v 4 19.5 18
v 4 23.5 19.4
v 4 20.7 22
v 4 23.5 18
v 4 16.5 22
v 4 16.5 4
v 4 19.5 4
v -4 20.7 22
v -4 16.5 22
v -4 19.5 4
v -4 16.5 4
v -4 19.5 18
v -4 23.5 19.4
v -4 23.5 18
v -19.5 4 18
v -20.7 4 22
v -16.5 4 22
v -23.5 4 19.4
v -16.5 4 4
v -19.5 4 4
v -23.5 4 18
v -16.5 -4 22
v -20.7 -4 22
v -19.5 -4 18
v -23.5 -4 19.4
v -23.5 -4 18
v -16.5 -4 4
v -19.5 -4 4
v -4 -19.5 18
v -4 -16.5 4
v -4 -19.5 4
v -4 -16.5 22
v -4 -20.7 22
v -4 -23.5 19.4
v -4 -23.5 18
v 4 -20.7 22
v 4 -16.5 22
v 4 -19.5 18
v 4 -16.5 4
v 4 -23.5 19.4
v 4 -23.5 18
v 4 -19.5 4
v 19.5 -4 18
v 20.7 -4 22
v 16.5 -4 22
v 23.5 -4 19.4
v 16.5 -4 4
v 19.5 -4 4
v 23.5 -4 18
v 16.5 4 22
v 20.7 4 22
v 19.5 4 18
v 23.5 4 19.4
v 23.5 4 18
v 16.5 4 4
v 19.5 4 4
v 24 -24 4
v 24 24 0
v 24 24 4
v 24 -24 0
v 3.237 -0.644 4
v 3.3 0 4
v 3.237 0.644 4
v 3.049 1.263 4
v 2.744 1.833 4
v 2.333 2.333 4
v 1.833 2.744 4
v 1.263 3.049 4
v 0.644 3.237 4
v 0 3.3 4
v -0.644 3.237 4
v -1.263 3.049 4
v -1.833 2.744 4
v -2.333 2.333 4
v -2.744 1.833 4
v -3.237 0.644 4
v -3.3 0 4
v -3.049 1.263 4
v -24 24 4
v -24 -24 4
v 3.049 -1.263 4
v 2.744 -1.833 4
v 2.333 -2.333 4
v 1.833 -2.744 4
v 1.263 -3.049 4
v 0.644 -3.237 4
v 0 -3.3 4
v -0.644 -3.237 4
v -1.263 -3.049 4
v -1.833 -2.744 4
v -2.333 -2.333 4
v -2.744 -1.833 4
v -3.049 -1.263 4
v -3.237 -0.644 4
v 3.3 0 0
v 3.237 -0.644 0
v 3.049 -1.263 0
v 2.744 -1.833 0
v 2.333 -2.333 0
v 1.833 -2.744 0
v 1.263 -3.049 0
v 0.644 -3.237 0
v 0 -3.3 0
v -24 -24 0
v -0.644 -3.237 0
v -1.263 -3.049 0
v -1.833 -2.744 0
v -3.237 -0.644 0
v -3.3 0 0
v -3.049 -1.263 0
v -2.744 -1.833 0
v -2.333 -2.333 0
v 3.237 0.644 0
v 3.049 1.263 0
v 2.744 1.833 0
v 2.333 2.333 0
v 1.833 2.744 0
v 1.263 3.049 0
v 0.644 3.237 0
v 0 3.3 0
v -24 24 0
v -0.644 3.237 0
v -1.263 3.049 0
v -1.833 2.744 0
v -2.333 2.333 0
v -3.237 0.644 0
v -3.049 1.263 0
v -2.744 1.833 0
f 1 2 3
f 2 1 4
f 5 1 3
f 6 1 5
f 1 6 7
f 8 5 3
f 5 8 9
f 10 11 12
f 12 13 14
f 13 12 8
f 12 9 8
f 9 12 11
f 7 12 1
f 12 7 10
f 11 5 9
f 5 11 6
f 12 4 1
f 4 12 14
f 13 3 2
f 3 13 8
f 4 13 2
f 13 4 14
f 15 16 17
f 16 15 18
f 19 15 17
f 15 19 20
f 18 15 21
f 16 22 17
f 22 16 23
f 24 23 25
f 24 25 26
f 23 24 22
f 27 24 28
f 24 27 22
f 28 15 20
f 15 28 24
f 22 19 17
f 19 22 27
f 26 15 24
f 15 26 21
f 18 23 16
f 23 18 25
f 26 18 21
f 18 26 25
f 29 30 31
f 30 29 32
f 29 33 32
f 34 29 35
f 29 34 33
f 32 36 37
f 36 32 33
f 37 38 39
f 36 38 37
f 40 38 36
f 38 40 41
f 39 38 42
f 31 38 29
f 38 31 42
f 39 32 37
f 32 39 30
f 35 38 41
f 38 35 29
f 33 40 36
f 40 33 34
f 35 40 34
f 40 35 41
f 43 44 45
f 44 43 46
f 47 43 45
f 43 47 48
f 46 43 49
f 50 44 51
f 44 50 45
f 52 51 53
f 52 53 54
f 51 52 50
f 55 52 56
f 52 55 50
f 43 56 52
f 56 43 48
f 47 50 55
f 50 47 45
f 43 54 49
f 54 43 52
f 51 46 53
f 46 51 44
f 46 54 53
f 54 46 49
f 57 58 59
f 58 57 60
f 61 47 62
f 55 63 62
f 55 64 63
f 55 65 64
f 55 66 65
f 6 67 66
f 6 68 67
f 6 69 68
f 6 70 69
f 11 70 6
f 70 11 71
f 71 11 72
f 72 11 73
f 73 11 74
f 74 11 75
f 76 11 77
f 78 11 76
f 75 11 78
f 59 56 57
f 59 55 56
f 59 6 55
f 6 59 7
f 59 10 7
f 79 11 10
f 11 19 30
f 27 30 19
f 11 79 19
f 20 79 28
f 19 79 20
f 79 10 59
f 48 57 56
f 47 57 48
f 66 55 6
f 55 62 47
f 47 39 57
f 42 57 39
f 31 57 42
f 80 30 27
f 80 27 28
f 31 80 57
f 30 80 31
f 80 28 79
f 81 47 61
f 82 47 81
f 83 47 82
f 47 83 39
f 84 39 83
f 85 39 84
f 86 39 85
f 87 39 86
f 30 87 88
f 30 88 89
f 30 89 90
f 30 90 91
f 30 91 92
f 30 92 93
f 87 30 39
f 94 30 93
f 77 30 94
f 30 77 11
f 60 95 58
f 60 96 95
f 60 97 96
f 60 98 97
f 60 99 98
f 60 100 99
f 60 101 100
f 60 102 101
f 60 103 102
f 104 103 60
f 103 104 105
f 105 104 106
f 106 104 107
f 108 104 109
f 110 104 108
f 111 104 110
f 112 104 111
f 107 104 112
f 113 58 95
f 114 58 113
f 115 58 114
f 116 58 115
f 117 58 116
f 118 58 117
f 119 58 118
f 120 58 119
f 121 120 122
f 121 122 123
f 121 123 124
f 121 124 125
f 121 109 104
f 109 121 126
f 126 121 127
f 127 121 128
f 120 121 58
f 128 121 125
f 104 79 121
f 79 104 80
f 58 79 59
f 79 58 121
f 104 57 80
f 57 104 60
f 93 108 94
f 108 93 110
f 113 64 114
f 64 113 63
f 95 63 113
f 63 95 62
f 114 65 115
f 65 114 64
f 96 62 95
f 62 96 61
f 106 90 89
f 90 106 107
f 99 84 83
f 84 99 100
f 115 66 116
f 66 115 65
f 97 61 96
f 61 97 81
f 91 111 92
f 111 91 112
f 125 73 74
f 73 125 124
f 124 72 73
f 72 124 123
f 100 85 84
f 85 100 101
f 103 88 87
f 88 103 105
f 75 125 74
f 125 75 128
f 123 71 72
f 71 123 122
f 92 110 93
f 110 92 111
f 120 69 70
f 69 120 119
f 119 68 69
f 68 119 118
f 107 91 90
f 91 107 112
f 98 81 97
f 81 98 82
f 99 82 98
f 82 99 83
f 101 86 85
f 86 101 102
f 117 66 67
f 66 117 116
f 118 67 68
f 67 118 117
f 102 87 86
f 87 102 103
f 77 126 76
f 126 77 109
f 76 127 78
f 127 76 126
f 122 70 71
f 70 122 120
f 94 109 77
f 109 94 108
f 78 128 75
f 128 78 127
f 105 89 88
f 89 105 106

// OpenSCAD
$fn = 32;

// ----------------------------------------------------------------------
// Snap-fit latch: 4 arms, 18 mm tall, 4.2 mm undercut hooks
// ----------------------------------------------------------------------

// --- parameters (mm) ---
base_d = 48;              // base plate depth
base_h = 4;               // base plate thickness
span = 36;                // distance between opposite arms
arm_t = 3;                // arm thickness
arm_d = 8;                // arm width
height = 18;              // free arm length
head_len = 4.2;           // hook reach
head_h = 4;               // hook height
lead = 1.4;               // lead-in ramp thickness
bore_d = 6.6;             // base fixing bore
top_z = 22;               // height of the arm tips above the base

arms = 4;

difference() {
  union() {
    /* base plate, centred on the arm ring */
    translate([-24, -24, 0]) cube([base_d, base_d, base_h]);
    for (a = [0 : 360 / arms : 359]) rotate([0, 0, a]) {
    /* arm, sunk 0.5 mm into the base */
    translate([-arm_d / 2, span / 2 - arm_t / 2, base_h - 0.5]) cube([arm_d, arm_t, height + 0.5]);
    /* hook: a convex hull of a tall inner block and a thin outer lip
       gives a flat undercut below and a lead-in ramp on top */
    hull() {
      translate([-arm_d / 2, span / 2 + arm_t / 2 - 0.6, top_z - head_h]) cube([arm_d, lead + 0.4, head_h]);
      translate([-arm_d / 2, span / 2 + arm_t / 2 - 0.2, top_z - head_h]) cube([arm_d, head_len, lead]);
    }
    }
  }
  translate([0, 0, -2.5]) cylinder(h = base_h + 5, d = bore_d);
}
